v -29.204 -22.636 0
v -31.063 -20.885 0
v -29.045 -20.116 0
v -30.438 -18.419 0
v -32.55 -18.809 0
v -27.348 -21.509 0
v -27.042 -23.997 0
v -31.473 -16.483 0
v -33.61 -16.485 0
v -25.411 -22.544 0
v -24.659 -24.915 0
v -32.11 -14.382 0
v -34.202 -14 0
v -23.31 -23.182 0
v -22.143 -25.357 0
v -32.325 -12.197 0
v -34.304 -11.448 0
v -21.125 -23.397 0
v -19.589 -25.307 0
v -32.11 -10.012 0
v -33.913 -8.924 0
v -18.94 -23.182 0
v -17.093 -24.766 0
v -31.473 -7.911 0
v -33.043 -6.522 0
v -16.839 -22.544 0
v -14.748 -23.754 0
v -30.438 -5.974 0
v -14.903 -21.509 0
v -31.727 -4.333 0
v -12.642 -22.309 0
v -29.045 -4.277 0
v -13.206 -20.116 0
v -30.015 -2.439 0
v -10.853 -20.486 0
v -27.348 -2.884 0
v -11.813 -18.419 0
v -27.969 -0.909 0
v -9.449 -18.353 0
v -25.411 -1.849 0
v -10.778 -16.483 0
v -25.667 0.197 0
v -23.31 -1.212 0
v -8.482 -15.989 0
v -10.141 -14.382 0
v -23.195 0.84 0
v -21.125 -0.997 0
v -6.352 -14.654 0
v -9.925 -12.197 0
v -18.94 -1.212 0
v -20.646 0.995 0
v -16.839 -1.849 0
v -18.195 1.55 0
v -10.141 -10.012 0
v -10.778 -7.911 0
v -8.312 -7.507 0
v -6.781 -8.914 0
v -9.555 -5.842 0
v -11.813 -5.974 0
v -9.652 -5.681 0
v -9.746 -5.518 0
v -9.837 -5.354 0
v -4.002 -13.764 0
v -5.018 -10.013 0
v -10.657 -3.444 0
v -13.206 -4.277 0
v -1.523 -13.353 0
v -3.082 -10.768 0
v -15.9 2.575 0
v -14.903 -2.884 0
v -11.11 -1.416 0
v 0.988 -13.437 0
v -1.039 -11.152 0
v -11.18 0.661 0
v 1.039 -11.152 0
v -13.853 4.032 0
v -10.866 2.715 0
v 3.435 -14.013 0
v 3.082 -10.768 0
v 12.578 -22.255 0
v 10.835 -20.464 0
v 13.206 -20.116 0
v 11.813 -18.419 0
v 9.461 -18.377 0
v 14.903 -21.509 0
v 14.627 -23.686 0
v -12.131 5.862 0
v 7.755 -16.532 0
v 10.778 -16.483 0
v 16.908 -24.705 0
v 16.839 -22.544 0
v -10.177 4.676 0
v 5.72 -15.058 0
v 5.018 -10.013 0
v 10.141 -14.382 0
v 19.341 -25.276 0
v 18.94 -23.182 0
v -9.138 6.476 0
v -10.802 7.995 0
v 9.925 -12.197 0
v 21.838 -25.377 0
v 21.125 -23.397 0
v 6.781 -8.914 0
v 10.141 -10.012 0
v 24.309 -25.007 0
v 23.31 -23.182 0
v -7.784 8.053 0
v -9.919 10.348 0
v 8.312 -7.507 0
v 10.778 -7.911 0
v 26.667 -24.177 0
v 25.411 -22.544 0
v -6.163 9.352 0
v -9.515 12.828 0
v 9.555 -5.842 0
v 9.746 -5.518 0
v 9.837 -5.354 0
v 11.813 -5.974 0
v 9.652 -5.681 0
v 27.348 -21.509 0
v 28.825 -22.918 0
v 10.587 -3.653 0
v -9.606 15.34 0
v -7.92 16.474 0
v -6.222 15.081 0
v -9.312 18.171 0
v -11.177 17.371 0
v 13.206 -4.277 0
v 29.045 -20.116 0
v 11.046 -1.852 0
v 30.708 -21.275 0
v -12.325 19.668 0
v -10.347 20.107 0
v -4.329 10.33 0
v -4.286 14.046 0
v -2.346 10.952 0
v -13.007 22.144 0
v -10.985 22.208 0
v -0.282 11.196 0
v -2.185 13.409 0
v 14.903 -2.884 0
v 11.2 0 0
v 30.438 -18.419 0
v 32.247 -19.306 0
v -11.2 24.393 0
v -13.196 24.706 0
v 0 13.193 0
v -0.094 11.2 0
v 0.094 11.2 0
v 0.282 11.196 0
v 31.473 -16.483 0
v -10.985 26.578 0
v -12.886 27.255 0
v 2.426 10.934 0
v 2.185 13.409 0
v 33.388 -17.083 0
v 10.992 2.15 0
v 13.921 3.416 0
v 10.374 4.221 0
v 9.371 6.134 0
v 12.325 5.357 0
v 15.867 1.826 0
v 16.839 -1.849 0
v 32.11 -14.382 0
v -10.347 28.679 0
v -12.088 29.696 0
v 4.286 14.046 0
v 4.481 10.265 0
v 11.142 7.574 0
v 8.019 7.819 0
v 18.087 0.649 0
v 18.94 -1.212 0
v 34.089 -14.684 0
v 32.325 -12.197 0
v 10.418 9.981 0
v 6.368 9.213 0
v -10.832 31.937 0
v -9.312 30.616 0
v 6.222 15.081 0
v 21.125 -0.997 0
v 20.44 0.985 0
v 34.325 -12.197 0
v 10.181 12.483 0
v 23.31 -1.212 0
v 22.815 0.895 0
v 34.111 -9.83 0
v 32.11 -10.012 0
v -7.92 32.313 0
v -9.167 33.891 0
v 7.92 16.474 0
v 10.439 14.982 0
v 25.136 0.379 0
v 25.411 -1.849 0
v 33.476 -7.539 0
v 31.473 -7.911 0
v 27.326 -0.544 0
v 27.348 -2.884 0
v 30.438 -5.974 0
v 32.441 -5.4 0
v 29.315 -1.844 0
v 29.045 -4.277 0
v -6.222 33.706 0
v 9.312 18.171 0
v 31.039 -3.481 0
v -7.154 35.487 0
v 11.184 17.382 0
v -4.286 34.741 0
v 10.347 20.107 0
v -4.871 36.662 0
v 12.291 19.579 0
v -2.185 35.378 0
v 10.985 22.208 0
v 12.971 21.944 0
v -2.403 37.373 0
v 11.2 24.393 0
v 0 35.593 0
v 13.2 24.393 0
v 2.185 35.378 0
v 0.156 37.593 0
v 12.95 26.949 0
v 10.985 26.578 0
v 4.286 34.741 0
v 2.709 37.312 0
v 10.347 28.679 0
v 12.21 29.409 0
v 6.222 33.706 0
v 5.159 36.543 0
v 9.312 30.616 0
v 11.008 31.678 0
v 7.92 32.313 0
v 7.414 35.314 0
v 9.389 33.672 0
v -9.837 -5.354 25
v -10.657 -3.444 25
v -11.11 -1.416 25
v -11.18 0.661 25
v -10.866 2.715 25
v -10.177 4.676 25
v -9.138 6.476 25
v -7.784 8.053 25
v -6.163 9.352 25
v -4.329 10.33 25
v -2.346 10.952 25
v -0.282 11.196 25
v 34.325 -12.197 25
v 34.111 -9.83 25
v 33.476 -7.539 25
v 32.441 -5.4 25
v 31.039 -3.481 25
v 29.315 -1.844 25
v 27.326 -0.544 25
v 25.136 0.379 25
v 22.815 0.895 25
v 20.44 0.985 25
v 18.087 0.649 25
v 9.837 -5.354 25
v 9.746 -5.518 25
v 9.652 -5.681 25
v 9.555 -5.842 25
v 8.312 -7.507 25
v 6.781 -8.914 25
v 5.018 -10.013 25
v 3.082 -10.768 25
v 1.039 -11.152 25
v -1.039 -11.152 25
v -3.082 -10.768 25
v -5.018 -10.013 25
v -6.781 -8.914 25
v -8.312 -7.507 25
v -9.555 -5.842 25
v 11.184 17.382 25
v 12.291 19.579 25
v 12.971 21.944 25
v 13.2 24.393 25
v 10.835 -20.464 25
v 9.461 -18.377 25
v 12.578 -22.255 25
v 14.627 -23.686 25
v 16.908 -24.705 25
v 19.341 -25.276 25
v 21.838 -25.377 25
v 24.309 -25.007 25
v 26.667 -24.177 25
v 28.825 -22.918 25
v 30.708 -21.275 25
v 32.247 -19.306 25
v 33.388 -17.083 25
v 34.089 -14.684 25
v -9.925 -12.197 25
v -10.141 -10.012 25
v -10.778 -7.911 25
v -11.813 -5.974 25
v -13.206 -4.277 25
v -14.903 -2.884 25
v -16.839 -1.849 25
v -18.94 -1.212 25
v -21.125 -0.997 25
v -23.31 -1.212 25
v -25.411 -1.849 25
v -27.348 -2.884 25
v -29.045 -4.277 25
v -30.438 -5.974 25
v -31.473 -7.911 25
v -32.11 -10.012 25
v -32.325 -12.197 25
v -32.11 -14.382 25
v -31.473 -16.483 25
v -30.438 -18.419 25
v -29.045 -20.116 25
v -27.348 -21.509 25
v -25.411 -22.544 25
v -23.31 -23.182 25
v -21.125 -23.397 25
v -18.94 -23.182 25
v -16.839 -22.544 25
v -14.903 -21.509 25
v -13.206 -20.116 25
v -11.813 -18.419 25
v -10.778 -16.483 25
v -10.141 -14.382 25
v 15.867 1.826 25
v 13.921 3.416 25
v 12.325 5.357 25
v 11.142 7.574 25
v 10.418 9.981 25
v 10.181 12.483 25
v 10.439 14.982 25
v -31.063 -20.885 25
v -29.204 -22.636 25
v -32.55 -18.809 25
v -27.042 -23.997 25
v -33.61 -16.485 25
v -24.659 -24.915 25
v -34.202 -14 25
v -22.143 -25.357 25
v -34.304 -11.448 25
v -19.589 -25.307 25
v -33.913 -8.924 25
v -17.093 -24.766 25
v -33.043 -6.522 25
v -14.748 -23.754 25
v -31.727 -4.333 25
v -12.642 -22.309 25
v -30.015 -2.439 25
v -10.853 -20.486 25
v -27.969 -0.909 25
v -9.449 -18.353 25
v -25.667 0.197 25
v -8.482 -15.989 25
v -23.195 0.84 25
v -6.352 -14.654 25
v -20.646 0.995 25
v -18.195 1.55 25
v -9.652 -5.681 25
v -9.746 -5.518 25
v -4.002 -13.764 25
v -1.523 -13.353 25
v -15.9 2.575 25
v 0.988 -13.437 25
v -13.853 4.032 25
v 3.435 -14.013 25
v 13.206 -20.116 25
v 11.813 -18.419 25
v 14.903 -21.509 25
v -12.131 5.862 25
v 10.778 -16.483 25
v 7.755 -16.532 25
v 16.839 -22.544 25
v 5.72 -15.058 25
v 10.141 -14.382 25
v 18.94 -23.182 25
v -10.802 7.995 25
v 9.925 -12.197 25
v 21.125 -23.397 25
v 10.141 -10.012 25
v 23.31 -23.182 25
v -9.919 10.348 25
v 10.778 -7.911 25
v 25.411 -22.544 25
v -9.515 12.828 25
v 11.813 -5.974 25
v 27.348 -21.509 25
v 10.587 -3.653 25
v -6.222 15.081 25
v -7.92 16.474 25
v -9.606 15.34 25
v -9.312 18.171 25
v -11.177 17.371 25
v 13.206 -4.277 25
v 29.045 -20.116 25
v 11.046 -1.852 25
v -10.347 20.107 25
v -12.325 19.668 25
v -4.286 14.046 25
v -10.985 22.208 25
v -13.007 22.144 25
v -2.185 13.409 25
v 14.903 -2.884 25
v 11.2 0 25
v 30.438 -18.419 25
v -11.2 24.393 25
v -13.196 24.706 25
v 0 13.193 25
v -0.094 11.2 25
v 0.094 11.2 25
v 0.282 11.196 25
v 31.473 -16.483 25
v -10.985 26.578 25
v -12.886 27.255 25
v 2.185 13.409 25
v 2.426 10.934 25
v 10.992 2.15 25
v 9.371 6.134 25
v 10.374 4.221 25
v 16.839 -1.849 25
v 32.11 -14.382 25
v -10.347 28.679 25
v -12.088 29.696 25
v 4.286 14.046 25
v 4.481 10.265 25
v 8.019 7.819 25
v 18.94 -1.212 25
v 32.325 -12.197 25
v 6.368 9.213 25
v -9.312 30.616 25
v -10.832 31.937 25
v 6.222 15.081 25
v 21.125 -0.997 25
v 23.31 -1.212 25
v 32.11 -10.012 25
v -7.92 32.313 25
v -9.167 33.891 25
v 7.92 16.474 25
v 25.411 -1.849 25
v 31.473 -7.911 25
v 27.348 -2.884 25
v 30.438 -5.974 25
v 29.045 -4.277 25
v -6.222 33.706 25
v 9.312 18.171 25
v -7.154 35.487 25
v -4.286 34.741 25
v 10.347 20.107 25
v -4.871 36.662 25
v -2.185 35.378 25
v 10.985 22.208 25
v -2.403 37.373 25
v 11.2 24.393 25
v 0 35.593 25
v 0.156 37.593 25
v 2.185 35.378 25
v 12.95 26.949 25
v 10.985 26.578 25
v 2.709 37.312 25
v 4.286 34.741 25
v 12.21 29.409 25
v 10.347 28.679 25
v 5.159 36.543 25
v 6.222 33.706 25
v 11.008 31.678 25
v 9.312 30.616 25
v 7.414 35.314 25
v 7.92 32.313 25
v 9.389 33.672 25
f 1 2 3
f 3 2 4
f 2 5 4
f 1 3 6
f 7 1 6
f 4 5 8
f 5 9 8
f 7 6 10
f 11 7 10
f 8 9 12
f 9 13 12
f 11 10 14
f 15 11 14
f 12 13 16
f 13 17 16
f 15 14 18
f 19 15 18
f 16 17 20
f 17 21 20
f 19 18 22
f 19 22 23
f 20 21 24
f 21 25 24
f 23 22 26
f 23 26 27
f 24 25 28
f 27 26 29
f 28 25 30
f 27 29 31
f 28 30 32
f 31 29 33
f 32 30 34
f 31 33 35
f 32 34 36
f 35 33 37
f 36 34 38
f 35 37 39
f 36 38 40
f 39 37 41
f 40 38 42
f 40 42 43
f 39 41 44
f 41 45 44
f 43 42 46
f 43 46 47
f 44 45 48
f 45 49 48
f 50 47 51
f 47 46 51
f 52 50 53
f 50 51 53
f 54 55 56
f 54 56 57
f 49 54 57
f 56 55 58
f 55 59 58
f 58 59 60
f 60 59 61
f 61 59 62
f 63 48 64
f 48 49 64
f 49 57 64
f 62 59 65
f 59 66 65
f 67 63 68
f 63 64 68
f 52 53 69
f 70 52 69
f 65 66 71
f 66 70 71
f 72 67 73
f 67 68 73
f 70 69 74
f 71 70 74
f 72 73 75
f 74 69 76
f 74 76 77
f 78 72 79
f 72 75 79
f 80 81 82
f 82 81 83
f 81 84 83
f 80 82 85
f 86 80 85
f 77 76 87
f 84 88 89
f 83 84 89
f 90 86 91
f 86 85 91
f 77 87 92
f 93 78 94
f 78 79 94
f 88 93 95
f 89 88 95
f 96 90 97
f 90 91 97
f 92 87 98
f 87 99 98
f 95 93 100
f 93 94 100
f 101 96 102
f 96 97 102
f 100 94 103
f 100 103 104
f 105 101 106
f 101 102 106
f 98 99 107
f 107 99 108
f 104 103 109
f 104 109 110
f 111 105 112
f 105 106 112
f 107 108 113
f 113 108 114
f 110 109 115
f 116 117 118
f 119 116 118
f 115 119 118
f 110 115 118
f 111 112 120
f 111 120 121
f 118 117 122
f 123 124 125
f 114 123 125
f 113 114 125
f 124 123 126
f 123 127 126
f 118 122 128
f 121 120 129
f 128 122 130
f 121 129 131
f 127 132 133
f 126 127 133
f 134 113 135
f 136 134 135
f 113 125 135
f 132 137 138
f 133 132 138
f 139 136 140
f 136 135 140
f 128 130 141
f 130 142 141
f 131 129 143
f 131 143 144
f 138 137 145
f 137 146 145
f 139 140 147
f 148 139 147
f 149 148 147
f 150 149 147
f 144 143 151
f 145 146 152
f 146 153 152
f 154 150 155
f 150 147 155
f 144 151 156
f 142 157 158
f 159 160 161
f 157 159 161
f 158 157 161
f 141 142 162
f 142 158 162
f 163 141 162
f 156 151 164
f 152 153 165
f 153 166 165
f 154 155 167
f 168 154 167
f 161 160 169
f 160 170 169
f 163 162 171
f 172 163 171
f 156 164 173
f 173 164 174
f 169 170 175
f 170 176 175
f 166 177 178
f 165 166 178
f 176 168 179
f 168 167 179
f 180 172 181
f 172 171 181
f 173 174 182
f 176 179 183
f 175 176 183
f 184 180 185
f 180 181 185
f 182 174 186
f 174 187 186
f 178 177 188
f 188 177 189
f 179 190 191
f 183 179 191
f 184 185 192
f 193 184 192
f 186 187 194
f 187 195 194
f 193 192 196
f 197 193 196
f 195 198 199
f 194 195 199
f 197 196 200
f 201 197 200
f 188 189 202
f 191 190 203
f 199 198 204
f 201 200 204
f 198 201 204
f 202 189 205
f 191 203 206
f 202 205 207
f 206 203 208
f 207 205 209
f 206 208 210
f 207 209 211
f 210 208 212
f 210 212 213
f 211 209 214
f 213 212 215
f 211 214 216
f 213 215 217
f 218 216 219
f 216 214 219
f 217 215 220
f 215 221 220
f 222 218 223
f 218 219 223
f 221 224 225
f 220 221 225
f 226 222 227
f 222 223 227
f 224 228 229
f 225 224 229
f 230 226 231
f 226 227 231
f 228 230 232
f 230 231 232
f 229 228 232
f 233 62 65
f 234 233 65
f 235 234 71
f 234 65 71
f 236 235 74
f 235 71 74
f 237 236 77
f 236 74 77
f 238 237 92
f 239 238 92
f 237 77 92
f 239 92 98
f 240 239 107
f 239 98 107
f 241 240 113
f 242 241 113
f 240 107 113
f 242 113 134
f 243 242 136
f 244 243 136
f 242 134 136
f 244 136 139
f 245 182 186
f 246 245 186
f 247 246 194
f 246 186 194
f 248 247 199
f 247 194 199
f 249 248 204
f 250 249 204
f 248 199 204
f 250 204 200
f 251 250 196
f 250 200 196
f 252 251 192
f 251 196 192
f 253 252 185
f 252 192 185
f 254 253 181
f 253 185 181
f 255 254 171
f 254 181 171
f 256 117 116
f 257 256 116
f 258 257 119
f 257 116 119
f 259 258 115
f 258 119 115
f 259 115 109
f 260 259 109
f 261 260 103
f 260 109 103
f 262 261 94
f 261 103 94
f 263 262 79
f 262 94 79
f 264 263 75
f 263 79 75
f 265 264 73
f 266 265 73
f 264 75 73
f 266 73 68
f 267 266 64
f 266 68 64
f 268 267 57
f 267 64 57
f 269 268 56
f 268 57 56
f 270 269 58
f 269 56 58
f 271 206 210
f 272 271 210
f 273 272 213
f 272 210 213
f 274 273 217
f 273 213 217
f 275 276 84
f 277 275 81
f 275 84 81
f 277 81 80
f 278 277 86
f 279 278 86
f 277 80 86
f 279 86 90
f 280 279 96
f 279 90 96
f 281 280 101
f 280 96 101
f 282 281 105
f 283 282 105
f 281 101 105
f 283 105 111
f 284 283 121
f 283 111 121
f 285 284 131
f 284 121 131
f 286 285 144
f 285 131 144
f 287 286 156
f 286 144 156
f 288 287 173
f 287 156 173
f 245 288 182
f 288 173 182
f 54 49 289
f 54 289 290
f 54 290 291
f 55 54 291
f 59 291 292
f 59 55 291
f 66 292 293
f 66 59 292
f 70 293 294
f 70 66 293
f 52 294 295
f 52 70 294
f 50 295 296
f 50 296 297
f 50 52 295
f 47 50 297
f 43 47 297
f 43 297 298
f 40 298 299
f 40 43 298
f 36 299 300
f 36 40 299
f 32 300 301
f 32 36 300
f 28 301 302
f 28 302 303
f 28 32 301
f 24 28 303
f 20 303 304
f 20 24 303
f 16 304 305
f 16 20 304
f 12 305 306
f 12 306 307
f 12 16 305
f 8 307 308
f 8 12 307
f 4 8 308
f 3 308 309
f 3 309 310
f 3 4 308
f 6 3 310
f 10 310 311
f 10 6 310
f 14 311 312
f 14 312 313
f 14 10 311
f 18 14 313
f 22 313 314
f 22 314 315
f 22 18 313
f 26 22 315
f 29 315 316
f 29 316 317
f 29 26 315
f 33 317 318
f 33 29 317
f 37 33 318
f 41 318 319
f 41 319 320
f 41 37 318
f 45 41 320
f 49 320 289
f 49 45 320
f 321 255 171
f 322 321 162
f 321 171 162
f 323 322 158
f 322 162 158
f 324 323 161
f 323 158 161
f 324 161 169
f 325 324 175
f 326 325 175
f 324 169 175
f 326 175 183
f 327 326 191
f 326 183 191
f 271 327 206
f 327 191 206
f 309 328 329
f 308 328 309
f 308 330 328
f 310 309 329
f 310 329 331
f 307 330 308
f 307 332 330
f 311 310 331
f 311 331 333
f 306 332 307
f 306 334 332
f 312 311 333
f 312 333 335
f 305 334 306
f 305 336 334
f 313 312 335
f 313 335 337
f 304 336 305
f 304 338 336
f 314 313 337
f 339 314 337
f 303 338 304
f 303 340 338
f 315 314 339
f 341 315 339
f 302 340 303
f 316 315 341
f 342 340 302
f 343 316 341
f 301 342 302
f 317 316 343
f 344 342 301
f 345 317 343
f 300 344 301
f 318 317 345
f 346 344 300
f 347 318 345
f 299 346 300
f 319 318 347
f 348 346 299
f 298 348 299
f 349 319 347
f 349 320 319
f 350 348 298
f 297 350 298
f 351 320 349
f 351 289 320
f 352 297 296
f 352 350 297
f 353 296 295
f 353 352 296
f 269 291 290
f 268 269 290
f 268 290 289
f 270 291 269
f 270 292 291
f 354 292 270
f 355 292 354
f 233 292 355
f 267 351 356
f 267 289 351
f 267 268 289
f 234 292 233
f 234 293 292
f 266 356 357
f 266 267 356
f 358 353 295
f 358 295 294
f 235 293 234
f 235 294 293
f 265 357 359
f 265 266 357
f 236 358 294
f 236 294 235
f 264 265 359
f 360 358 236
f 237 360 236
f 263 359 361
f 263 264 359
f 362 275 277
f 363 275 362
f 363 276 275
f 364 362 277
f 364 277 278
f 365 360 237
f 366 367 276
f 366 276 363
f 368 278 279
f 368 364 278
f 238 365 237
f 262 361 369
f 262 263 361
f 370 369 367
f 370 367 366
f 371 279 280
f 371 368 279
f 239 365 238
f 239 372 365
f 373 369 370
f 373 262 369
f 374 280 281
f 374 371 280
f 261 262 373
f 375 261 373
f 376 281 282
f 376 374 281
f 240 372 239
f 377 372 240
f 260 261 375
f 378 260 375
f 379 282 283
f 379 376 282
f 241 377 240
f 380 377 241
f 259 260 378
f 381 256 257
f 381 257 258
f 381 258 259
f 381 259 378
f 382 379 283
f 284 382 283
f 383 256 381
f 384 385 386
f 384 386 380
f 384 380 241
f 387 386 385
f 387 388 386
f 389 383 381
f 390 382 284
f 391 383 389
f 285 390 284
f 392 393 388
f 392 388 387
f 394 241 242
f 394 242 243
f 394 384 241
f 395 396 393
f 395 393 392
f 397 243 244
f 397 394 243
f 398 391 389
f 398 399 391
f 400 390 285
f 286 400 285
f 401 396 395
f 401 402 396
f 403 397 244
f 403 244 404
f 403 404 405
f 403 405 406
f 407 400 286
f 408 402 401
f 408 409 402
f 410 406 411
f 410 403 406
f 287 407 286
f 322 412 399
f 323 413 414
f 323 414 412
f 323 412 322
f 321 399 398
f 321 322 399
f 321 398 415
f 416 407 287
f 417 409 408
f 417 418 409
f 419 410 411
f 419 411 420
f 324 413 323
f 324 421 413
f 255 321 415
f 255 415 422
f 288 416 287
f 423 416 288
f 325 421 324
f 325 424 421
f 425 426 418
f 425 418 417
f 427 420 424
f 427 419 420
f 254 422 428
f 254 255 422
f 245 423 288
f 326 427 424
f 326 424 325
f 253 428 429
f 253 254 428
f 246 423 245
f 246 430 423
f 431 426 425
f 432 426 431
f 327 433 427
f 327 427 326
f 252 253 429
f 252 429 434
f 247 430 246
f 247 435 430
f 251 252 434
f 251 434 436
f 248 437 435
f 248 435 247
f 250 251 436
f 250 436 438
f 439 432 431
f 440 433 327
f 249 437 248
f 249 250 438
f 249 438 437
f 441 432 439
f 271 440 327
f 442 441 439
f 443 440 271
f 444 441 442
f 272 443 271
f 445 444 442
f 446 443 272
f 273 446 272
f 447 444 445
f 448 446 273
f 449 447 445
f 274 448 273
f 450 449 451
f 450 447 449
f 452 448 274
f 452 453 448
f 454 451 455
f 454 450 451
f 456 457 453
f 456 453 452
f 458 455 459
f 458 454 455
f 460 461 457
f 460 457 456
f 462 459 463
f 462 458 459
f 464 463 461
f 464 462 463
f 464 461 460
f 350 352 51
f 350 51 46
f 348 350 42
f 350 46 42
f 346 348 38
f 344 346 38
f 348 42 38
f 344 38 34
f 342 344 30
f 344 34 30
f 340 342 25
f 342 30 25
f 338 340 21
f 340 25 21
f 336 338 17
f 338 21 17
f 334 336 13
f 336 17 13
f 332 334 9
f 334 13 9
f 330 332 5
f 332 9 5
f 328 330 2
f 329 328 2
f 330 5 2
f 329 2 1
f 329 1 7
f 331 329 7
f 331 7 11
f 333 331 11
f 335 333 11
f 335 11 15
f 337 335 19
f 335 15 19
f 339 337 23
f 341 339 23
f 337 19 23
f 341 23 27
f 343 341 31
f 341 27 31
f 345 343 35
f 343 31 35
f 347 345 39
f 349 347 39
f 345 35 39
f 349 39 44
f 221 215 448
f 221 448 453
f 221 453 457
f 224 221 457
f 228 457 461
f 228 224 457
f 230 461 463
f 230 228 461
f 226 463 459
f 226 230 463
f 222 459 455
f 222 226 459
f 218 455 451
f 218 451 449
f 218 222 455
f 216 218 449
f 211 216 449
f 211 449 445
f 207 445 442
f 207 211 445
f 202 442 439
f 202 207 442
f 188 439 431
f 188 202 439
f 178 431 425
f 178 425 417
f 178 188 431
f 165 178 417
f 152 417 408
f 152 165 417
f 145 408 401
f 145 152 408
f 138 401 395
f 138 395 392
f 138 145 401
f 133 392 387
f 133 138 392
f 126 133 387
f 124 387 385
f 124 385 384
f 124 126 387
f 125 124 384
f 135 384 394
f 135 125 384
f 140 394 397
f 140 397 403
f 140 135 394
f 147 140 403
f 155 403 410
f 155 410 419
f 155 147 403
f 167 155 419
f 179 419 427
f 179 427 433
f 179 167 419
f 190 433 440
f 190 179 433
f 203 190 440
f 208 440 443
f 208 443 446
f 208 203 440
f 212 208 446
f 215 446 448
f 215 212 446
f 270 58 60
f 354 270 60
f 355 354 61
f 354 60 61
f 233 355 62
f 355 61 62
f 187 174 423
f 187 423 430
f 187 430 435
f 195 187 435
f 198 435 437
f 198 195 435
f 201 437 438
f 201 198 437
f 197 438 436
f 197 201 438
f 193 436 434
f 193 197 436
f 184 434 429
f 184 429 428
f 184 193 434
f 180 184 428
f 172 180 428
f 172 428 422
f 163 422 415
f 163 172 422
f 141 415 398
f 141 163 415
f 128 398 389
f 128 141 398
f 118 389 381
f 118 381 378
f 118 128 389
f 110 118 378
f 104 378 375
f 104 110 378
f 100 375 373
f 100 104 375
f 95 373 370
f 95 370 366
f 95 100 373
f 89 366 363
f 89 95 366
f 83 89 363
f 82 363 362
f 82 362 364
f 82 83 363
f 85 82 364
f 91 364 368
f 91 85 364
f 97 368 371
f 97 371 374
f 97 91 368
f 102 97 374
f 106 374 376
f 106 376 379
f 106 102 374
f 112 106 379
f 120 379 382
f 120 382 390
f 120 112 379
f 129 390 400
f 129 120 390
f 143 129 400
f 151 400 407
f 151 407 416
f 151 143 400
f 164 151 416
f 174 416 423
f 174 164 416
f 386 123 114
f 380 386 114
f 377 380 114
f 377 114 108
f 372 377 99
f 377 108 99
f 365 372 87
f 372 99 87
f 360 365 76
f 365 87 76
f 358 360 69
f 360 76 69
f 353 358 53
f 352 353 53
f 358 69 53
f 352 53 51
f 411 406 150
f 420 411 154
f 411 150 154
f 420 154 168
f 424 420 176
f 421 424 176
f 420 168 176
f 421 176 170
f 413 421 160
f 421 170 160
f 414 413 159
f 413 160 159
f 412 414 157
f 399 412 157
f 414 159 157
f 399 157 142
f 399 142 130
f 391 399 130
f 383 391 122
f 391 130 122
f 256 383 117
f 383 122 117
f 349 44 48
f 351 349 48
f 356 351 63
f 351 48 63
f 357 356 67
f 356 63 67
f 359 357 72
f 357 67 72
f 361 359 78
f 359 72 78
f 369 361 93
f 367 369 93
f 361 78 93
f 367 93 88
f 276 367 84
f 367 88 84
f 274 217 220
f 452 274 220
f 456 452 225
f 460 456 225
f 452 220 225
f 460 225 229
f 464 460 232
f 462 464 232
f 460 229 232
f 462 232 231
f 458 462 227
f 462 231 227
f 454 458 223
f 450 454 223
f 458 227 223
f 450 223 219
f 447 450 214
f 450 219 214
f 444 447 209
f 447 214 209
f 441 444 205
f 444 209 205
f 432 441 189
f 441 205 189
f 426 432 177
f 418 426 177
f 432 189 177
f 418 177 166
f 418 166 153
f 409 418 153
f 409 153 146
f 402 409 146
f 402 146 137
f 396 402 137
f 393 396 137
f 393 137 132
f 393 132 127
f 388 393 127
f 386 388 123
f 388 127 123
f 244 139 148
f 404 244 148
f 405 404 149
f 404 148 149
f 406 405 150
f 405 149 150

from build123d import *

# Parameters (mm, degrees)
F0_R     = 11.2
F1_DEPTH = 25


with BuildPart() as f1:
    # F0 (on Top) → F1 (new body)
    with BuildSketch(Plane.XY):
        with BuildLine():
            ThreePointArc((0.281874, 11.196452), (8.018634, 7.819303), (11.2, 0))
            ThreePointArc((11.2, 0), (10.853993, -2.762398), (9.837349, -5.354116))
            ThreePointArc((9.837349, -5.354116), (13.358937, -1.523251), (18.087433, 0.648944))
            ThreePointArc((18.087433, 0.648944), (11.142377, 7.574406), (11.184069, 17.382265))
            ThreePointArc((11.184069, 17.382265), (6.514064, 12.912721), (0.281874, 11.196452))
        make_face()
        with BuildLine():
            ThreePointArc((-0.281874, 11.196452), (0, 11.2), (0.281874, 11.196452))
            ThreePointArc((0.281874, 11.196452), (6.514064, 12.912721), (11.184069, 17.382265))
            ThreePointArc((11.184069, 17.382265), (12.68601, 20.74582), (13.2, 24.393442))
            ThreePointArc((13.2, 24.393442), (-4.87055, 36.66201), (-9.605719, 15.339705))
            ThreePointArc((-9.605719, 15.339705), (-5.360295, 12.330804), (-0.281874, 11.196452))
        make_face()
        with Locations((0, 24.393442)):
            Circle(F0_R, mode=Mode.SUBTRACT)
        with BuildLine():
            ThreePointArc((18.087433, 0.648944), (13.358937, -1.523251), (9.837349, -5.354116))
            ThreePointArc((9.837349, -5.354116), (9.699485, -5.6), (9.555475, -5.842337))
            ThreePointArc((9.555475, -5.842337), (7.925712, -12.097705), (9.461449, -18.37682))
            ThreePointArc((9.461449, -18.37682), (24.309413, -25.006939), (34.325341, -12.196721))
            ThreePointArc((34.325341, -12.196721), (29.314957, -1.844418), (18.087433, 0.648944))
        make_face()
        with Locations((21.125341, -12.196721)):
            Circle(F0_R, mode=Mode.SUBTRACT)
        with BuildLine():
            ThreePointArc((-9.837349, -5.354116), (-9.699485, 5.6), (-0.281874, 11.196452))
            ThreePointArc((-0.281874, 11.196452), (-5.360295, 12.330804), (-9.605719, 15.339705))
            ThreePointArc((-9.605719, 15.339705), (-12.130817, 5.862379), (-20.645517, 0.994555))
            ThreePointArc((-20.645517, 0.994555), (-14.439776, -0.815015), (-9.837349, -5.354116))
        make_face()
        with BuildLine():
            ThreePointArc((9.461449, -18.37682), (7.925712, -12.097705), (9.555475, -5.842337))
            ThreePointArc((9.555475, -5.842337), (0, -11.2), (-9.555475, -5.842337))
            ThreePointArc((-9.555475, -5.842337), (-8.339368, -8.916647), (-7.925341, -12.196721))
            ThreePointArc((-7.925341, -12.196721), (-8.065175, -14.112985), (-8.481715, -15.988649))
            ThreePointArc((-8.481715, -15.988649), (0.98844, -13.436785), (9.461449, -18.37682))
        make_face()
        with BuildLine():
            ThreePointArc((-9.555475, -5.842337), (-9.699485, -5.6), (-9.837349, -5.354116))
            ThreePointArc((-9.837349, -5.354116), (-14.439776, -0.815015), (-20.645517, 0.994555))
            ThreePointArc((-20.645517, 0.994555), (-31.856768, -19.882843), (-8.481715, -15.988649))
            ThreePointArc((-8.481715, -15.988649), (-8.065175, -14.112985), (-7.925341, -12.196721))
            ThreePointArc((-7.925341, -12.196721), (-8.339368, -8.916647), (-9.555475, -5.842337))
        make_face()
        with Locations((-21.125341, -12.196721)):
            Circle(F0_R, mode=Mode.SUBTRACT)
    extrude(amount=F1_DEPTH)


solid = f1.part
